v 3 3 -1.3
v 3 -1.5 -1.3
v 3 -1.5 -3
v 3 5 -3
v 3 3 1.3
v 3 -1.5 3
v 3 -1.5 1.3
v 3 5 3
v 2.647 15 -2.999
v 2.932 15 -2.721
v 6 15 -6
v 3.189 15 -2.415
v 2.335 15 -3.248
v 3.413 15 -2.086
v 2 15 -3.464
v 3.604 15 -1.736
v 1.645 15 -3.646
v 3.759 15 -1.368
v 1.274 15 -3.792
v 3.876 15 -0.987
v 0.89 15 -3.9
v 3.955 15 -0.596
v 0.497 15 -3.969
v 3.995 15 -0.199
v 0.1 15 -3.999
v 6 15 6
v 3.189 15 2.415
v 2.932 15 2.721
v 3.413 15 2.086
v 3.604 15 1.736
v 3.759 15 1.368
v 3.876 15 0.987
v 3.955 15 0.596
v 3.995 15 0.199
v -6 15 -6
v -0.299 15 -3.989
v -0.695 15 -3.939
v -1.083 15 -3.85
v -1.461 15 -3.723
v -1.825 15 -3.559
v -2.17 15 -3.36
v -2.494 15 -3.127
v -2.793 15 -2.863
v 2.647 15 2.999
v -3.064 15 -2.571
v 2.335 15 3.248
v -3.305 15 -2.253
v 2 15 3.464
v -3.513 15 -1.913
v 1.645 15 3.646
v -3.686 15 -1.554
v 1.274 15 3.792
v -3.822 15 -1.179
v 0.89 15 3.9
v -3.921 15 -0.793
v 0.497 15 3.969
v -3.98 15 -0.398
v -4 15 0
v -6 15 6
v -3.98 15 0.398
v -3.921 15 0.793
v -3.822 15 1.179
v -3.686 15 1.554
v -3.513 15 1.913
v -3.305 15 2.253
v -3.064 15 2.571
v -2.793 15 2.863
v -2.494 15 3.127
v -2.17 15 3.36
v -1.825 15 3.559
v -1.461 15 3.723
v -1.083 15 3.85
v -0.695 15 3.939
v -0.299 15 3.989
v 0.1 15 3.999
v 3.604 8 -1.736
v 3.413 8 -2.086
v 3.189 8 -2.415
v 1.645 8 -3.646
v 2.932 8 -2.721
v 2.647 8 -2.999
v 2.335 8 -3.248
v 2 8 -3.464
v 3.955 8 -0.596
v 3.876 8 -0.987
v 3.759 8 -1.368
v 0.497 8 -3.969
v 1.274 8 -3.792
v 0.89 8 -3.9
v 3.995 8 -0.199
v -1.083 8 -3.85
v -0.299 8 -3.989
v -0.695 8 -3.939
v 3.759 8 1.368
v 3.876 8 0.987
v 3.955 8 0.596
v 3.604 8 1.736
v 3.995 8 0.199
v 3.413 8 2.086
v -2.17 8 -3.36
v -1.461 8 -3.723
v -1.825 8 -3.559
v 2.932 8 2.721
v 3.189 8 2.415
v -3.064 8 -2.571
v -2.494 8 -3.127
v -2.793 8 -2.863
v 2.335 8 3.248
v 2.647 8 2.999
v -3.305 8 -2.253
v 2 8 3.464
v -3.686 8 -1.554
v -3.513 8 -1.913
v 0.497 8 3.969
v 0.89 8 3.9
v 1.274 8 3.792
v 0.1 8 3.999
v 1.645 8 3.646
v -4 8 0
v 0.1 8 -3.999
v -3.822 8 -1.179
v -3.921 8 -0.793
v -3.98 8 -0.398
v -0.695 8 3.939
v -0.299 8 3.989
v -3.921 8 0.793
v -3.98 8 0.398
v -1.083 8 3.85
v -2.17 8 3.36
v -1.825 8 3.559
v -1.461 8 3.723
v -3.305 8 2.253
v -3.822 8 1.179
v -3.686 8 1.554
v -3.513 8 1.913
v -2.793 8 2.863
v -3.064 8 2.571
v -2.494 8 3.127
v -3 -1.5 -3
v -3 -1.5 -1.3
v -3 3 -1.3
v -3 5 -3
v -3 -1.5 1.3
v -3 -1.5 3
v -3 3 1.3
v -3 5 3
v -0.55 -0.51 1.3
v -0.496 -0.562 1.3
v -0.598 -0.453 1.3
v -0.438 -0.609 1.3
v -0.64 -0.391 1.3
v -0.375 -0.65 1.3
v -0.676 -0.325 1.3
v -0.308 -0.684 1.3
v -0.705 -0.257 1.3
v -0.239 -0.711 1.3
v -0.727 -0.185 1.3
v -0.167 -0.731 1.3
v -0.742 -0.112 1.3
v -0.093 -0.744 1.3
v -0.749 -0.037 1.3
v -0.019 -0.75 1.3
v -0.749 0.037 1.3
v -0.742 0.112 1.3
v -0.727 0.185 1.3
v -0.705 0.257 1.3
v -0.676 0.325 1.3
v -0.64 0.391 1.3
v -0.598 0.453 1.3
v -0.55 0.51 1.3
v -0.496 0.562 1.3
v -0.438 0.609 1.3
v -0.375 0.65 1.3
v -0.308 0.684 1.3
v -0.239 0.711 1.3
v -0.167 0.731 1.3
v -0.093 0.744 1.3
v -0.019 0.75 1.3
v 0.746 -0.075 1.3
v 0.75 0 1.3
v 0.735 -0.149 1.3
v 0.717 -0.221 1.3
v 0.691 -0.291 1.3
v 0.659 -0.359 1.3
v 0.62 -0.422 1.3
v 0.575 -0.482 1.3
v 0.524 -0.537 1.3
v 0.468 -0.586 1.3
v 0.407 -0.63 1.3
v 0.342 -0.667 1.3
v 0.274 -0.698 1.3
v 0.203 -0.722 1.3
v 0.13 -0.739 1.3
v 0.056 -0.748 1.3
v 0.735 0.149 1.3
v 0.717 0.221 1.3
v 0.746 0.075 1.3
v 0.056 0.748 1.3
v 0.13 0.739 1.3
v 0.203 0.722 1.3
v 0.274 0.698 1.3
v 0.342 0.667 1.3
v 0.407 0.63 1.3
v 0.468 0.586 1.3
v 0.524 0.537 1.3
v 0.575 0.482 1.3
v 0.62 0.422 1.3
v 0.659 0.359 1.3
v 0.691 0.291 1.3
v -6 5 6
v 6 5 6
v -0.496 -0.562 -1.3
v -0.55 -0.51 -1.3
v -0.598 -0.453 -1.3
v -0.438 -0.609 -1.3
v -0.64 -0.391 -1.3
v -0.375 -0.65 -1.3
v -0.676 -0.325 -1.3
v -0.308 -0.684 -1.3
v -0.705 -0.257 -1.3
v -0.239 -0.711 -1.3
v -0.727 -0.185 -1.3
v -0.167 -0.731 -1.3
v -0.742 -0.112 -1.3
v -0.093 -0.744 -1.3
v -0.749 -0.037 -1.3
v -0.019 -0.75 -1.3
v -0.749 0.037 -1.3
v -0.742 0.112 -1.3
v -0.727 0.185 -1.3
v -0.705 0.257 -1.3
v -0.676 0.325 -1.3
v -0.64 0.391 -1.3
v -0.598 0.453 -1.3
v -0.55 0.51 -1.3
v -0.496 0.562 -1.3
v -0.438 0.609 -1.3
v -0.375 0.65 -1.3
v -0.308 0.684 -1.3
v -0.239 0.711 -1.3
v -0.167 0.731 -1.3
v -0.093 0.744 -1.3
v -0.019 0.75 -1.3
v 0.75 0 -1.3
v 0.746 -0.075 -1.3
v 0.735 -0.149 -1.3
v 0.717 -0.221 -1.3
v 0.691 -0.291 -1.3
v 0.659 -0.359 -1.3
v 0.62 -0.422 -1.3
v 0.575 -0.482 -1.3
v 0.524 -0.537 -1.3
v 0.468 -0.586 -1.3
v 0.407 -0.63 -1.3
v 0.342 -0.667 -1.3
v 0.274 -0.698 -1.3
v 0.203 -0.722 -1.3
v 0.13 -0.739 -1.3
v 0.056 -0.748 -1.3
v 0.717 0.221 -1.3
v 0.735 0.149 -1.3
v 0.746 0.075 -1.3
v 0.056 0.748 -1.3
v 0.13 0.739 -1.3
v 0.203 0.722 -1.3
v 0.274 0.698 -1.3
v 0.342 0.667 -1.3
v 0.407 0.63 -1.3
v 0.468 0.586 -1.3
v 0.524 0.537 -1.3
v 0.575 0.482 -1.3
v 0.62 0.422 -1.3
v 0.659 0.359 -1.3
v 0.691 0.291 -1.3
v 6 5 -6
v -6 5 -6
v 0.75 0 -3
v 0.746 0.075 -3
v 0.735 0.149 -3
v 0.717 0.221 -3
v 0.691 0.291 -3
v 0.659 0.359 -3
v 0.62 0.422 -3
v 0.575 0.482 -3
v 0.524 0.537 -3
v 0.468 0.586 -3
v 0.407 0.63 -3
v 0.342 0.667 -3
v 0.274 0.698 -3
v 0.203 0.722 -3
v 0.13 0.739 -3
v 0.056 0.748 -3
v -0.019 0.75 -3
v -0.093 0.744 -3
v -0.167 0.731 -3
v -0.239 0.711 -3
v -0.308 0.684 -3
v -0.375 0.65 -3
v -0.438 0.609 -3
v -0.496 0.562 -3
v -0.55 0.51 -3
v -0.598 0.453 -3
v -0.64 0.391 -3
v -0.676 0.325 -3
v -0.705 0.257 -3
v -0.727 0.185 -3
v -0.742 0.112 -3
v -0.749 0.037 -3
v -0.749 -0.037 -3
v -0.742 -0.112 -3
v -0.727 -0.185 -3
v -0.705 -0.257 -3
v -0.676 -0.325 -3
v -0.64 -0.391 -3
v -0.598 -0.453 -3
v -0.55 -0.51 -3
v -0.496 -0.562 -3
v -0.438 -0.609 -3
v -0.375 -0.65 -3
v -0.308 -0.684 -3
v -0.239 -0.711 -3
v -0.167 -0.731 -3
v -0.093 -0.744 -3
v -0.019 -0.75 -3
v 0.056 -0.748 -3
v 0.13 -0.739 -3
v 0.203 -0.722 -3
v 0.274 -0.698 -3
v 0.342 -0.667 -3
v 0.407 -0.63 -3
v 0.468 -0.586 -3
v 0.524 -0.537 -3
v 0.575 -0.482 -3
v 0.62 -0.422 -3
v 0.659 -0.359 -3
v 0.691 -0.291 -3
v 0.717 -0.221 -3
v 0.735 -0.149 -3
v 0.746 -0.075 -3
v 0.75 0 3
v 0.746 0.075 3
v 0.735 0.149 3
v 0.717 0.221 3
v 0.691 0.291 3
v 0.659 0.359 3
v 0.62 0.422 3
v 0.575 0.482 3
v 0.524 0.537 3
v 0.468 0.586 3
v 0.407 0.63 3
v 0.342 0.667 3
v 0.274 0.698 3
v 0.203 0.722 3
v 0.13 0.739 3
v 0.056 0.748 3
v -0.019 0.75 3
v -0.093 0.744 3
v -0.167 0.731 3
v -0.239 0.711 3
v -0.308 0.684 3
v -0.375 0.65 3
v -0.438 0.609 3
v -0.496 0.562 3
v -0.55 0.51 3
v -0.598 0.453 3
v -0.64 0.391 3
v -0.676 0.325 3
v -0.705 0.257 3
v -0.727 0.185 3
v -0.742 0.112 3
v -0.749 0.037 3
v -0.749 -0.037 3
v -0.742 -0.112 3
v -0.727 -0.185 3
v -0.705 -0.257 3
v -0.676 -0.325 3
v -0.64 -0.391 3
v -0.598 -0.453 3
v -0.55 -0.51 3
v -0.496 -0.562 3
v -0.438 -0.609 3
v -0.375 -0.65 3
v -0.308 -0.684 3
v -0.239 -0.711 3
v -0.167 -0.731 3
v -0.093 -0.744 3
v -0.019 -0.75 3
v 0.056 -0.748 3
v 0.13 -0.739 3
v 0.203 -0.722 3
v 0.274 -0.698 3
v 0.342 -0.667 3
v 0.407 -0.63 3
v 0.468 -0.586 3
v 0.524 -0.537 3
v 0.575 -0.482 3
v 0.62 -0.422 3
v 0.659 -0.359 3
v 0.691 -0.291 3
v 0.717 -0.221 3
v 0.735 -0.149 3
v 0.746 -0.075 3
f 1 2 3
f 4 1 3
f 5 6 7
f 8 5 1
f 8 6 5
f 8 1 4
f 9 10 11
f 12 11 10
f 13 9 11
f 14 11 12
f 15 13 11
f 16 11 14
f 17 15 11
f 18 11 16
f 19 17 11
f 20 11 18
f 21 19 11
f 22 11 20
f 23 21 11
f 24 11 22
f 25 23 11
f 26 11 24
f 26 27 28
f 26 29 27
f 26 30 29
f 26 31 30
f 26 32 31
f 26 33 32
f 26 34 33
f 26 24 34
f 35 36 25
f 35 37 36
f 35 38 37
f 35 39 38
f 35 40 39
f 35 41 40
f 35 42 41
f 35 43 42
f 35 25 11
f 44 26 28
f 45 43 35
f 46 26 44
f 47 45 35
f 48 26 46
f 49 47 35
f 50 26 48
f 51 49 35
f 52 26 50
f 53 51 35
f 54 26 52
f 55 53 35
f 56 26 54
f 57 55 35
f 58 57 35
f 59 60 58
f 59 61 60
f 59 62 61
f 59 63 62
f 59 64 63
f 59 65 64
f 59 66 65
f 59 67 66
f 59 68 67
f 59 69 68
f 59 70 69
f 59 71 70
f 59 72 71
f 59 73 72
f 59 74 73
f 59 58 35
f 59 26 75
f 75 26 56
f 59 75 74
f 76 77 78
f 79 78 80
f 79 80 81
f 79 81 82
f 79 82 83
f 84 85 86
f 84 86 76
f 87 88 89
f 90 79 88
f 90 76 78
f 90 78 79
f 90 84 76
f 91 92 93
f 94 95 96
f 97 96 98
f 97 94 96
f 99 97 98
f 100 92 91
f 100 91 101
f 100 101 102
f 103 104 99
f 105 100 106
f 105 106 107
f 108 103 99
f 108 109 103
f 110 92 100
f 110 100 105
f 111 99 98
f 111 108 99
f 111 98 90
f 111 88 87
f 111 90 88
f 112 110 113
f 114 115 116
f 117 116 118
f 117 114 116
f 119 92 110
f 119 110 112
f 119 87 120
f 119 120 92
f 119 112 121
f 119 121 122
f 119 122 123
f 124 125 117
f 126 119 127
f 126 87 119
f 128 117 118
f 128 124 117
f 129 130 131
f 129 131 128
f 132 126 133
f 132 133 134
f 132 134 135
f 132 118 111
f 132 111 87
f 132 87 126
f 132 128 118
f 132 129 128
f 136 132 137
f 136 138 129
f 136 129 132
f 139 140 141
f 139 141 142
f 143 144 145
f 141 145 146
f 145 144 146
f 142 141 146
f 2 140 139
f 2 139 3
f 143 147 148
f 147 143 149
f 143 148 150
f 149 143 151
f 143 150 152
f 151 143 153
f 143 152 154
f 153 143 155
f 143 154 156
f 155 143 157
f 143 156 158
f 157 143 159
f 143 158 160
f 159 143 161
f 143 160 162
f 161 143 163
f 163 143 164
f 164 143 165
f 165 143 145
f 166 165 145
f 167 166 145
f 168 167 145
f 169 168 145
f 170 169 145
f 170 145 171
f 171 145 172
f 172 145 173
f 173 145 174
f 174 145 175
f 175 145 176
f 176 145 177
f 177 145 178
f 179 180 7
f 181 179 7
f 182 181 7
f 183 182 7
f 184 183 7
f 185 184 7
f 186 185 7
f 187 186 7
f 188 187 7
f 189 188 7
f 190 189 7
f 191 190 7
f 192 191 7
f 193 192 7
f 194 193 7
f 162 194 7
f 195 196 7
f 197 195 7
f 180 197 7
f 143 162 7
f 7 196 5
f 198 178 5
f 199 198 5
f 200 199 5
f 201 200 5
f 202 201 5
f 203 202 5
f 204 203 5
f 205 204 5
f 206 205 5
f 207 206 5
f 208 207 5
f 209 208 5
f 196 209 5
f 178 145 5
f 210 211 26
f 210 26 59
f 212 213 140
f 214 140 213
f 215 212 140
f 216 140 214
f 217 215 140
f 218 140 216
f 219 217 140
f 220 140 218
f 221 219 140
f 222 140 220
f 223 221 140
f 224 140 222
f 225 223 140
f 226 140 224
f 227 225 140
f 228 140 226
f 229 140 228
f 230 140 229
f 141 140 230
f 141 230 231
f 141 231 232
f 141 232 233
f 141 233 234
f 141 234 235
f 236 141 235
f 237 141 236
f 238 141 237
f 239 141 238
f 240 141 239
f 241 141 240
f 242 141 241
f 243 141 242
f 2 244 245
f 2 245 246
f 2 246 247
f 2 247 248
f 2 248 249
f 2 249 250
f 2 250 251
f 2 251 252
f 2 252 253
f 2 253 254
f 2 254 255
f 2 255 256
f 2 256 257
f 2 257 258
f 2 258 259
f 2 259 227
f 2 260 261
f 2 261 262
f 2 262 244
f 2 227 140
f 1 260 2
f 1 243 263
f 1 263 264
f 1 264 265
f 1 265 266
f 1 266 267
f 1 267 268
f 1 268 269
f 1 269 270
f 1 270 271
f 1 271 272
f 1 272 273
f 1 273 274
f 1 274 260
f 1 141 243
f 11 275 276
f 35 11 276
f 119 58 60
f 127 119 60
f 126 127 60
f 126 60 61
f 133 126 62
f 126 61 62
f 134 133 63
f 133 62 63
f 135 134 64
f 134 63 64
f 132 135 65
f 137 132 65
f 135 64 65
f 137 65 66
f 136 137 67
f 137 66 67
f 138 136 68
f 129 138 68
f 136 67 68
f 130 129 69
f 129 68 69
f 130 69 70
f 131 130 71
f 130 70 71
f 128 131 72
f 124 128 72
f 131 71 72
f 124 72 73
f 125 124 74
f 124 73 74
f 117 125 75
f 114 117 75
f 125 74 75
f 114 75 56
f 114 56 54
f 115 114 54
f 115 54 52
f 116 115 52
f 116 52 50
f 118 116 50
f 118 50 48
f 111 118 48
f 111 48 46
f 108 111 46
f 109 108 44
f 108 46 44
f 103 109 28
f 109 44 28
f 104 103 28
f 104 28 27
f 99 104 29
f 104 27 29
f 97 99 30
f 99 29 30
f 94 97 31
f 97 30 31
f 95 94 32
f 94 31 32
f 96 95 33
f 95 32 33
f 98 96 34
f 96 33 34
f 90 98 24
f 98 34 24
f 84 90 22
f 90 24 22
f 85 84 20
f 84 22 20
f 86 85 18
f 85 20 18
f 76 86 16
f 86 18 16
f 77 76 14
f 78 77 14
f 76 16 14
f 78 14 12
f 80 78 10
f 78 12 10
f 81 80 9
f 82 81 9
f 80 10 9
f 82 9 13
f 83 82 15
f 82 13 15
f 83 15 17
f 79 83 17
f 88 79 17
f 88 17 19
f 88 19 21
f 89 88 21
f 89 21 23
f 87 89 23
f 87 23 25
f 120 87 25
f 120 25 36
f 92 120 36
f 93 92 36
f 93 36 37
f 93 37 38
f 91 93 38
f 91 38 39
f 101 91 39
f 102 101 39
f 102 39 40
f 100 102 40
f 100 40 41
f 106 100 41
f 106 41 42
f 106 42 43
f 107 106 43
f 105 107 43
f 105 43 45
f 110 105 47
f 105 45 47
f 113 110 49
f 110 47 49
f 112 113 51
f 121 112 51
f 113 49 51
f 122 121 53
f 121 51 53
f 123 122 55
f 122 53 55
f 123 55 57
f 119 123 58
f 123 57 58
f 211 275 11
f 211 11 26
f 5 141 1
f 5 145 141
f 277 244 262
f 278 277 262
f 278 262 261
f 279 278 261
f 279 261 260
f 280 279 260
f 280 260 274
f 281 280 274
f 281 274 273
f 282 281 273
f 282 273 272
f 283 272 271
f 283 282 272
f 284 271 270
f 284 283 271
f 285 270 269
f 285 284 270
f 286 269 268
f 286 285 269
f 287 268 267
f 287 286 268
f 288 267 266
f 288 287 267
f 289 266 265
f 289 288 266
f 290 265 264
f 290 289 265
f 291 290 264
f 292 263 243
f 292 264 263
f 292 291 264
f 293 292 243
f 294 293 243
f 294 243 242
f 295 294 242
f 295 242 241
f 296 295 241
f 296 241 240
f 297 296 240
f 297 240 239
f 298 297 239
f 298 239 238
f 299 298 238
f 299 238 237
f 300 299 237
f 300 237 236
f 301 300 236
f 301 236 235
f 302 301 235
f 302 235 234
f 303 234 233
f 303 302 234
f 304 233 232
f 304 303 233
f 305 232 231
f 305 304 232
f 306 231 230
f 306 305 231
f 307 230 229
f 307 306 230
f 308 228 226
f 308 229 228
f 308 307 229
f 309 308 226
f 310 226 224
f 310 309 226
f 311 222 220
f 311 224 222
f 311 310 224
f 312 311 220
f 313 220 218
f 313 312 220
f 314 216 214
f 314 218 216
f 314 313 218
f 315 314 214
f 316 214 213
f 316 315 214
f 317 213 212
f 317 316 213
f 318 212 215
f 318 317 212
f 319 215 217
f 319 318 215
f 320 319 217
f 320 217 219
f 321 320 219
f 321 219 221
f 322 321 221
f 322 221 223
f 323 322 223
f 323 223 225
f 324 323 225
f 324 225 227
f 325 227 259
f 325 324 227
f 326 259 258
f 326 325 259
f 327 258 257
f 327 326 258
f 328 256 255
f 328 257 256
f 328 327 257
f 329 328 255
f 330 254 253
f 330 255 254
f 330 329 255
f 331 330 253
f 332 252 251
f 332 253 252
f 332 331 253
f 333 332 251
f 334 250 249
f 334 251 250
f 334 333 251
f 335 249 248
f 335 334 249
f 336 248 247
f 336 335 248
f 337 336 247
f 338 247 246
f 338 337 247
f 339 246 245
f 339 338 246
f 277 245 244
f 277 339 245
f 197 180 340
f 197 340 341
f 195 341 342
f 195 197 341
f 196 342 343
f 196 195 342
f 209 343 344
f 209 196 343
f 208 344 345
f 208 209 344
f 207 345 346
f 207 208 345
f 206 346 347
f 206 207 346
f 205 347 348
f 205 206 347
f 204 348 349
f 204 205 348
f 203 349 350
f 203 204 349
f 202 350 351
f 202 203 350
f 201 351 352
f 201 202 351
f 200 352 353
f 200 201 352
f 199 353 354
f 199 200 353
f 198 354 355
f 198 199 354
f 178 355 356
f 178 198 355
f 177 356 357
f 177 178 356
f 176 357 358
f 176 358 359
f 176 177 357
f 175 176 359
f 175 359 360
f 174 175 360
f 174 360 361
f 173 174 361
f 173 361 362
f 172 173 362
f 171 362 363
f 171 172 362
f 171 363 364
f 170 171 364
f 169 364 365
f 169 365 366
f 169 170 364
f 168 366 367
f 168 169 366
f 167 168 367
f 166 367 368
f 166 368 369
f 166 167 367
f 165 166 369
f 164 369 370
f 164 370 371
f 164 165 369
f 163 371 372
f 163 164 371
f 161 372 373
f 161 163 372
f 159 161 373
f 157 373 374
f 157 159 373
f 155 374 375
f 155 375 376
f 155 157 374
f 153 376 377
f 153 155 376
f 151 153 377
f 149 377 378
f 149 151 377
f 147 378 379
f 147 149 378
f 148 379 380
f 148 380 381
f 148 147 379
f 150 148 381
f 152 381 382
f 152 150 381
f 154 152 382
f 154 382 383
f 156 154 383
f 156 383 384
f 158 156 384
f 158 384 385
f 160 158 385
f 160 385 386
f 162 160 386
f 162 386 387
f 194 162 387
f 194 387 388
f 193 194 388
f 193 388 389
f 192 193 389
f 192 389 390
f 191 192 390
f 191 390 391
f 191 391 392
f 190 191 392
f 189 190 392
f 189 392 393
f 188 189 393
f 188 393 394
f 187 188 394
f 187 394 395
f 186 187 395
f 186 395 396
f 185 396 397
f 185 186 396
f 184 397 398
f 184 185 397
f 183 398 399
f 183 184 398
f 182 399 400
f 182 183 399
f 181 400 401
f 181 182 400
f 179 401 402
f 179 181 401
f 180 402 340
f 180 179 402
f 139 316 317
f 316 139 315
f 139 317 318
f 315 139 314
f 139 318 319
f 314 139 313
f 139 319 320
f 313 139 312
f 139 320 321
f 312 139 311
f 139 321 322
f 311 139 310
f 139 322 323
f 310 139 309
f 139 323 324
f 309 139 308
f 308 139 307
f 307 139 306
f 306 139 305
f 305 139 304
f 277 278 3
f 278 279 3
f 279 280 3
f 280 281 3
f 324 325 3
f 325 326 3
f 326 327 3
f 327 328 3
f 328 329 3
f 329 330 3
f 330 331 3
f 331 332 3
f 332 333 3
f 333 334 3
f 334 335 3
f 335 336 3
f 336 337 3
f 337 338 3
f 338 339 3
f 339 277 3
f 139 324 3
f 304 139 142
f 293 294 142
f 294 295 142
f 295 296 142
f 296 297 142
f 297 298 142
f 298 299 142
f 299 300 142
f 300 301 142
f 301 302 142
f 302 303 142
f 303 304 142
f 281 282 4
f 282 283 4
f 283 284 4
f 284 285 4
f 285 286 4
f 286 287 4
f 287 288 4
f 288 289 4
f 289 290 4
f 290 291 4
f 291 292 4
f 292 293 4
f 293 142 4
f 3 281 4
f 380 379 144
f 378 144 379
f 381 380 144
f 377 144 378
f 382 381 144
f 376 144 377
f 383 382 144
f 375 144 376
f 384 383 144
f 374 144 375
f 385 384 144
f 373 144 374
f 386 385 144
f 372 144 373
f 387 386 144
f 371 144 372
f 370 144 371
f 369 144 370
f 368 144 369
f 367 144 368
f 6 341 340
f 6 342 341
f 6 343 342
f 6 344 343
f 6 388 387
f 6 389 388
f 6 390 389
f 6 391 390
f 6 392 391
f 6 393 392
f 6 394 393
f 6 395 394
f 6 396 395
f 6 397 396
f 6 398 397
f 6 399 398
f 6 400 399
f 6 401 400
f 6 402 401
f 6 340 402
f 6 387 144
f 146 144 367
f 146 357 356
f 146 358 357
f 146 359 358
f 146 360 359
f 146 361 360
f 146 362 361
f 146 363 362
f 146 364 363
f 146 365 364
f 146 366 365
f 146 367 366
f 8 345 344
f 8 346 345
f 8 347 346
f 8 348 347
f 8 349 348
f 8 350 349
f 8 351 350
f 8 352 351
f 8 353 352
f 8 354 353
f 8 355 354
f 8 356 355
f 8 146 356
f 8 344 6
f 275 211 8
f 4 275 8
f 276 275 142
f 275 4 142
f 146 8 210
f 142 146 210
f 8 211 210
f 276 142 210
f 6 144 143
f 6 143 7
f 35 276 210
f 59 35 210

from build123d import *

# Parameters (mm, degrees)
F0_W     = 6
F0_H     = 6.5
F0_R     = 0.75
F1_DEPTH = 3
F2_W     = 6
F2_H     = 6
F3_DEPTH = 1.3
F4_W     = 12
F4_H     = 12
F5_DEPTH = 10
F6_R     = 4
F7_DEPTH = 7


with BuildPart() as f1:
    # F0 (on Top) → F1 (new body, symmetric)
    with BuildSketch(Plane.XY):
        with Locations((0, 1.75)):
            Rectangle(F0_W, F0_H)
        Circle(F0_R, mode=Mode.SUBTRACT)
    extrude(amount=F1_DEPTH, both=True)

    # F2 (on Top) → F3 (cut, symmetric)
    with BuildSketch(Plane.XY):
        Rectangle(F2_W, F2_H)
    extrude(amount=F3_DEPTH, both=True, mode=Mode.SUBTRACT)

    # F4 (on face) → F5 (join)
    with BuildSketch(Plane(origin=(0, 5, 0), x_dir=(-1, 0, 0), z_dir=(0, 1, 0))):
        Rectangle(F4_W, F4_H)
    extrude(amount=F5_DEPTH)

    # F6 (on face) → F7 (cut)
    with BuildSketch(Plane(origin=(0, 15, 0), x_dir=(-1, 0, 0), z_dir=(0, 1, 0))):
        Circle(F6_R)
    extrude(amount=-F7_DEPTH, mode=Mode.SUBTRACT)


solid = f1.part
